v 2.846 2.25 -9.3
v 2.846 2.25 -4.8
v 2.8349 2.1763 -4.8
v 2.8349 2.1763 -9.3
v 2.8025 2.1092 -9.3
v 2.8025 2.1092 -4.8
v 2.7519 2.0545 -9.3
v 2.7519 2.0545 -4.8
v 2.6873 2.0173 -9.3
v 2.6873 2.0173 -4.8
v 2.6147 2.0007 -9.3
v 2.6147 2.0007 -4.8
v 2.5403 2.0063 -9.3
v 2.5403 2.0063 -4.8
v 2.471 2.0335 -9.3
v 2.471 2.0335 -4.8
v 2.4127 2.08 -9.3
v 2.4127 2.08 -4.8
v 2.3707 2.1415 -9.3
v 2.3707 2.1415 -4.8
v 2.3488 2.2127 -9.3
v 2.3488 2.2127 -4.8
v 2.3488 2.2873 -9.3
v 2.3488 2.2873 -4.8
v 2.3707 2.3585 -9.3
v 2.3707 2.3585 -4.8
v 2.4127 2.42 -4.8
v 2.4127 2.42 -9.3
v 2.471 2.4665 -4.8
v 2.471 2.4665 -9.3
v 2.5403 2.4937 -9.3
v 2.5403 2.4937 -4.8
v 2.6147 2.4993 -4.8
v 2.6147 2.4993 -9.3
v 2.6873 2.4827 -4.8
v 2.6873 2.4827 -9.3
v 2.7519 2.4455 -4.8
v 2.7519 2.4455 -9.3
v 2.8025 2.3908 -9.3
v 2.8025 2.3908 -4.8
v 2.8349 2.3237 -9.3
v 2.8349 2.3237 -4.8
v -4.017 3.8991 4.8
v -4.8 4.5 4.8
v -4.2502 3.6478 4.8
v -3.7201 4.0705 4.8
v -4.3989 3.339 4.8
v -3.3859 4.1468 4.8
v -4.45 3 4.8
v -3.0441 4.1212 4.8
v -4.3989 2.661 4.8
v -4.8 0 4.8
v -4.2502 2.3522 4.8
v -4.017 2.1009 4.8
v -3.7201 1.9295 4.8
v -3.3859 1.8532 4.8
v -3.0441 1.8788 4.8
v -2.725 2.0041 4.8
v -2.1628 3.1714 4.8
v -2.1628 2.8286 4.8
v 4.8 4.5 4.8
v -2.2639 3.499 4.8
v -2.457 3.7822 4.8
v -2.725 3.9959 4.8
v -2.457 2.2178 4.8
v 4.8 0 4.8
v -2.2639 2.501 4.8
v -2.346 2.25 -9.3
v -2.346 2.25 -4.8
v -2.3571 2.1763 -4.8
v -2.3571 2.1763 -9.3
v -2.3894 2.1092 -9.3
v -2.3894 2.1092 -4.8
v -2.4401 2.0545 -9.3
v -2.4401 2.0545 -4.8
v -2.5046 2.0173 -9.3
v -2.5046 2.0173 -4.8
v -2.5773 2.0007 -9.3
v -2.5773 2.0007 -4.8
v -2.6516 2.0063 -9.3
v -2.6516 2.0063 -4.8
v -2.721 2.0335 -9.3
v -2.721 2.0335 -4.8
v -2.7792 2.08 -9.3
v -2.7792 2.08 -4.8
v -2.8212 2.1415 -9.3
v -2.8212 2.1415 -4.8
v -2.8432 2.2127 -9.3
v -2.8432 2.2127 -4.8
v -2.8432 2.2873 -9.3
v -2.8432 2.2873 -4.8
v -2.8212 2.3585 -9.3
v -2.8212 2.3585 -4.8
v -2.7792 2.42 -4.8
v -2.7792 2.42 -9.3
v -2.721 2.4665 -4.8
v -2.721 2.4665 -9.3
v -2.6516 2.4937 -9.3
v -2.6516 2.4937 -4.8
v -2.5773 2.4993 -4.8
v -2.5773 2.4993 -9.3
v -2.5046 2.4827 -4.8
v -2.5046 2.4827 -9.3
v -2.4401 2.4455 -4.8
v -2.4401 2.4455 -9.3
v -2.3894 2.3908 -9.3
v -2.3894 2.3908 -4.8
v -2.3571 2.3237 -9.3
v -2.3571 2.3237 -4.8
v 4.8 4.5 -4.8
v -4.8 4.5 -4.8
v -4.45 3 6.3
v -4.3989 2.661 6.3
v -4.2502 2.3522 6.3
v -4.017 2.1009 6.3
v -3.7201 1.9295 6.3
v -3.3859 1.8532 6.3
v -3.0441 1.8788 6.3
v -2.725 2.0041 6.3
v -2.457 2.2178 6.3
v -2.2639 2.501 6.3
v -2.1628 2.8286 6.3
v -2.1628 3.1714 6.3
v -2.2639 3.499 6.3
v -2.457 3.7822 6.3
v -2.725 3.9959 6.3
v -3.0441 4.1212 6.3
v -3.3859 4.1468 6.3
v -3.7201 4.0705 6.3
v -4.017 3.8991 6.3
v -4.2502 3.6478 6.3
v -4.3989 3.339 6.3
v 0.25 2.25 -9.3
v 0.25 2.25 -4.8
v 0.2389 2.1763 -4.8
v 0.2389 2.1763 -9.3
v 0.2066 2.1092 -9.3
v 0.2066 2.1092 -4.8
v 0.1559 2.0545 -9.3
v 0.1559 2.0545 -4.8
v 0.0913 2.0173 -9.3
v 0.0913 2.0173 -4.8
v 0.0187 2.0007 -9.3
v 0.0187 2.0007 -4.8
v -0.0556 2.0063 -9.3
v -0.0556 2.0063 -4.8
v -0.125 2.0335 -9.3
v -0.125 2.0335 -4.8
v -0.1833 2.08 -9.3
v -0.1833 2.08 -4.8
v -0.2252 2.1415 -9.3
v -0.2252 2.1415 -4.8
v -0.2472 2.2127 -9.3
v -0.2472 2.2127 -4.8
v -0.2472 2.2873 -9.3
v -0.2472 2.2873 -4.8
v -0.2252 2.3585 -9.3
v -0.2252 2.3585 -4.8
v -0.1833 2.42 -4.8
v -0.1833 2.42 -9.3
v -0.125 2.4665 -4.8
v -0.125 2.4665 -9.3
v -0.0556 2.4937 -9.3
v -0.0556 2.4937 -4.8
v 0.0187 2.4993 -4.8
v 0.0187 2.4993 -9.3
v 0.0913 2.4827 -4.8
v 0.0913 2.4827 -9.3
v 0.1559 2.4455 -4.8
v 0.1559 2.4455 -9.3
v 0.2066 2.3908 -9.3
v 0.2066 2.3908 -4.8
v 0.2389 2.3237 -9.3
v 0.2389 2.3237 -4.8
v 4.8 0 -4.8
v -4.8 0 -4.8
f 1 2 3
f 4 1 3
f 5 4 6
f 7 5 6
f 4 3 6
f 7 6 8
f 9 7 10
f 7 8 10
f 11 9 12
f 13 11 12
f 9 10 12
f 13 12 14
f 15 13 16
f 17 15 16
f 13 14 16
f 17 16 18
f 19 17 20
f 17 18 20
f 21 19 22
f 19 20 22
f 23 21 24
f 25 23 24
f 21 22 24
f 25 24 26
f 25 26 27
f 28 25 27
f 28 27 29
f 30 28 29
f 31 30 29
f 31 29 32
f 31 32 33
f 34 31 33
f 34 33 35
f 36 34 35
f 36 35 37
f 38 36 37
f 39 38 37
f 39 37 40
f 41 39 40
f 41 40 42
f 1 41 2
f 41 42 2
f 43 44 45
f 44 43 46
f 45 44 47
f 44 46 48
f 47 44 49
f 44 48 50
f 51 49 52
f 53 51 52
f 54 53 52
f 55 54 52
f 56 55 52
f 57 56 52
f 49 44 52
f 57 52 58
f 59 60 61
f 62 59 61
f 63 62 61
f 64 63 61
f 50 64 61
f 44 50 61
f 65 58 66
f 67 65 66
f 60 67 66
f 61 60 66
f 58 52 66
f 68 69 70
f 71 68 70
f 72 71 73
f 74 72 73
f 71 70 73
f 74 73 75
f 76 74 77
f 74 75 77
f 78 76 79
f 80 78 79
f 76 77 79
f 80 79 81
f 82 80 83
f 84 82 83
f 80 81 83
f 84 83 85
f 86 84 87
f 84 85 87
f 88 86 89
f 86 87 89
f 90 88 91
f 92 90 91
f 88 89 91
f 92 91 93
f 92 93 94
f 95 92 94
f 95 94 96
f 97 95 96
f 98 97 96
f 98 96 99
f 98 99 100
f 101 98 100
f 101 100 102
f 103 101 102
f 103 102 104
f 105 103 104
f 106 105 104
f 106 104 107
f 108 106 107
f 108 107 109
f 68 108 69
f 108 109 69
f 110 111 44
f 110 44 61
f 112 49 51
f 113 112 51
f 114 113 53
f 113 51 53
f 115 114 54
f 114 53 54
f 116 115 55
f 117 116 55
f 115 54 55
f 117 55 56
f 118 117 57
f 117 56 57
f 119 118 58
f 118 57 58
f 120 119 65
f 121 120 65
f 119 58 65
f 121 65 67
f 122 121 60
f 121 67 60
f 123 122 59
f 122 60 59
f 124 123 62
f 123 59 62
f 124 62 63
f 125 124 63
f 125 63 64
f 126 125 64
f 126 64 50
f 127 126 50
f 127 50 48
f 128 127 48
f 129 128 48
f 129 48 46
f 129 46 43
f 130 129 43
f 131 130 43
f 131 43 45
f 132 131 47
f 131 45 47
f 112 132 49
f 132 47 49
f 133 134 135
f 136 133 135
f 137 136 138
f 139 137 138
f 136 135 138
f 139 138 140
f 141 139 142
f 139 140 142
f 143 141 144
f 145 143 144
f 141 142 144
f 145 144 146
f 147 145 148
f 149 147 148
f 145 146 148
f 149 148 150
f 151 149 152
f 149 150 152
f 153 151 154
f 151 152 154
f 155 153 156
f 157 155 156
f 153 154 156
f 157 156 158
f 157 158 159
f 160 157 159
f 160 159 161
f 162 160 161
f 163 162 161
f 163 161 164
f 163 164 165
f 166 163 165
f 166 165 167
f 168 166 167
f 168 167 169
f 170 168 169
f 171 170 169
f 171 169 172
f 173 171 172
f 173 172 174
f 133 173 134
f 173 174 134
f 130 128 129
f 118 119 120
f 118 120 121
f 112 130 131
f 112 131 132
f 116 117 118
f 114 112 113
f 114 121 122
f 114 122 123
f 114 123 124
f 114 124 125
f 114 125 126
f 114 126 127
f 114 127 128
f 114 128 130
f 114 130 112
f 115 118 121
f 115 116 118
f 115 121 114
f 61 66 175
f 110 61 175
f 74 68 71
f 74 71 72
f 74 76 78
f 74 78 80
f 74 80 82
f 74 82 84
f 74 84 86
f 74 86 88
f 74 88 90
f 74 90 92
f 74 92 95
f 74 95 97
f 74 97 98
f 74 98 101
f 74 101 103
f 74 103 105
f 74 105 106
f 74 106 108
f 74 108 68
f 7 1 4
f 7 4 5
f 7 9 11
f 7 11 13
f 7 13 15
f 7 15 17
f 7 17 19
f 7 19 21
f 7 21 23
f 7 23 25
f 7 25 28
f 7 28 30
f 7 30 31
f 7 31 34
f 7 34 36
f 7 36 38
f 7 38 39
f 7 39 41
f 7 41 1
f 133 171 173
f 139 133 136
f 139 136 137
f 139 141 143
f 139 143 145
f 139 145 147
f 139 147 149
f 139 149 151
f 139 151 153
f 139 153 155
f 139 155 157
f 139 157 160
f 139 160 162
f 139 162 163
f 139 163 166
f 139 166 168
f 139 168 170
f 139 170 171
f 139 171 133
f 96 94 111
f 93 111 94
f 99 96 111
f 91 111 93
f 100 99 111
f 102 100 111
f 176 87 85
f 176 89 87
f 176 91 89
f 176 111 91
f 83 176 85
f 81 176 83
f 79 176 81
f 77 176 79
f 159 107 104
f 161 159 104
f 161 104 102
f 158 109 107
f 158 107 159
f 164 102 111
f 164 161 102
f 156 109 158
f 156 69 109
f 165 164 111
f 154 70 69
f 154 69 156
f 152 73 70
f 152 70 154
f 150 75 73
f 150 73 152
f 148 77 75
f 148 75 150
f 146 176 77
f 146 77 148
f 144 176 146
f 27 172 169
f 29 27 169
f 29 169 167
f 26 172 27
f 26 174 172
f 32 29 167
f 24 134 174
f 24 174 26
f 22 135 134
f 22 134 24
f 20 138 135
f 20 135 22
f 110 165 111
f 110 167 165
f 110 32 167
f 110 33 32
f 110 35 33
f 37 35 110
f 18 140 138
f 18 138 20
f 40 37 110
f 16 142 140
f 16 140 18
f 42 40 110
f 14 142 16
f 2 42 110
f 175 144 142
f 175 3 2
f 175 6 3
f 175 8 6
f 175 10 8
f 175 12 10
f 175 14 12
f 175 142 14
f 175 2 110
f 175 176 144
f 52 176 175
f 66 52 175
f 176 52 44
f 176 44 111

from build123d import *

# Parameters (mm, degrees)
SKETCH_1_W      = 9.6
SKETCH_1_H      = 9.6
EXTRUDE_1_DEPTH = 4.5
SKETCH_3_R      = 0.25
EXTRUDE_3_DEPTH = 4.5
SKETCH_4_R      = 1.15
EXTRUDE_4_DEPTH = 1.5


with BuildPart() as part:
    # 草图1 → 拉伸1 (new body)
    with BuildSketch(Plane(origin=(0, 0, 0), x_dir=(1, 0, 0), z_dir=(0, 1, 0))):
        Rectangle(SKETCH_1_W, SKETCH_1_H)
    extrude(amount=EXTRUDE_1_DEPTH)

    # 草图3 → 拉伸3 (add)
    with BuildSketch(Plane(origin=(0, 0, -4.8), x_dir=(-1, 0, 0), z_dir=(0, 0, -1))):
        with Locations(Location((0, 2.25, 0), (0, 0, 180))):
            Circle(SKETCH_3_R)
        with Locations(Location((2.595978382, 2.25, 0), (0, 0, 180))):
            Circle(SKETCH_3_R)
        with Locations(Location((-2.595978382, 2.25, 0), (0, 0, 180))):
            Circle(SKETCH_3_R)
    extrude(amount=EXTRUDE_3_DEPTH)

    # 草图4 → 拉伸4 (add)
    with BuildSketch(Plane.XY.offset(4.8)):
        with Locations(Location((-3.3, 3, 0), (0, 0, 180))):
            Circle(SKETCH_4_R)
    extrude(amount=EXTRUDE_4_DEPTH)


solid = part.part
